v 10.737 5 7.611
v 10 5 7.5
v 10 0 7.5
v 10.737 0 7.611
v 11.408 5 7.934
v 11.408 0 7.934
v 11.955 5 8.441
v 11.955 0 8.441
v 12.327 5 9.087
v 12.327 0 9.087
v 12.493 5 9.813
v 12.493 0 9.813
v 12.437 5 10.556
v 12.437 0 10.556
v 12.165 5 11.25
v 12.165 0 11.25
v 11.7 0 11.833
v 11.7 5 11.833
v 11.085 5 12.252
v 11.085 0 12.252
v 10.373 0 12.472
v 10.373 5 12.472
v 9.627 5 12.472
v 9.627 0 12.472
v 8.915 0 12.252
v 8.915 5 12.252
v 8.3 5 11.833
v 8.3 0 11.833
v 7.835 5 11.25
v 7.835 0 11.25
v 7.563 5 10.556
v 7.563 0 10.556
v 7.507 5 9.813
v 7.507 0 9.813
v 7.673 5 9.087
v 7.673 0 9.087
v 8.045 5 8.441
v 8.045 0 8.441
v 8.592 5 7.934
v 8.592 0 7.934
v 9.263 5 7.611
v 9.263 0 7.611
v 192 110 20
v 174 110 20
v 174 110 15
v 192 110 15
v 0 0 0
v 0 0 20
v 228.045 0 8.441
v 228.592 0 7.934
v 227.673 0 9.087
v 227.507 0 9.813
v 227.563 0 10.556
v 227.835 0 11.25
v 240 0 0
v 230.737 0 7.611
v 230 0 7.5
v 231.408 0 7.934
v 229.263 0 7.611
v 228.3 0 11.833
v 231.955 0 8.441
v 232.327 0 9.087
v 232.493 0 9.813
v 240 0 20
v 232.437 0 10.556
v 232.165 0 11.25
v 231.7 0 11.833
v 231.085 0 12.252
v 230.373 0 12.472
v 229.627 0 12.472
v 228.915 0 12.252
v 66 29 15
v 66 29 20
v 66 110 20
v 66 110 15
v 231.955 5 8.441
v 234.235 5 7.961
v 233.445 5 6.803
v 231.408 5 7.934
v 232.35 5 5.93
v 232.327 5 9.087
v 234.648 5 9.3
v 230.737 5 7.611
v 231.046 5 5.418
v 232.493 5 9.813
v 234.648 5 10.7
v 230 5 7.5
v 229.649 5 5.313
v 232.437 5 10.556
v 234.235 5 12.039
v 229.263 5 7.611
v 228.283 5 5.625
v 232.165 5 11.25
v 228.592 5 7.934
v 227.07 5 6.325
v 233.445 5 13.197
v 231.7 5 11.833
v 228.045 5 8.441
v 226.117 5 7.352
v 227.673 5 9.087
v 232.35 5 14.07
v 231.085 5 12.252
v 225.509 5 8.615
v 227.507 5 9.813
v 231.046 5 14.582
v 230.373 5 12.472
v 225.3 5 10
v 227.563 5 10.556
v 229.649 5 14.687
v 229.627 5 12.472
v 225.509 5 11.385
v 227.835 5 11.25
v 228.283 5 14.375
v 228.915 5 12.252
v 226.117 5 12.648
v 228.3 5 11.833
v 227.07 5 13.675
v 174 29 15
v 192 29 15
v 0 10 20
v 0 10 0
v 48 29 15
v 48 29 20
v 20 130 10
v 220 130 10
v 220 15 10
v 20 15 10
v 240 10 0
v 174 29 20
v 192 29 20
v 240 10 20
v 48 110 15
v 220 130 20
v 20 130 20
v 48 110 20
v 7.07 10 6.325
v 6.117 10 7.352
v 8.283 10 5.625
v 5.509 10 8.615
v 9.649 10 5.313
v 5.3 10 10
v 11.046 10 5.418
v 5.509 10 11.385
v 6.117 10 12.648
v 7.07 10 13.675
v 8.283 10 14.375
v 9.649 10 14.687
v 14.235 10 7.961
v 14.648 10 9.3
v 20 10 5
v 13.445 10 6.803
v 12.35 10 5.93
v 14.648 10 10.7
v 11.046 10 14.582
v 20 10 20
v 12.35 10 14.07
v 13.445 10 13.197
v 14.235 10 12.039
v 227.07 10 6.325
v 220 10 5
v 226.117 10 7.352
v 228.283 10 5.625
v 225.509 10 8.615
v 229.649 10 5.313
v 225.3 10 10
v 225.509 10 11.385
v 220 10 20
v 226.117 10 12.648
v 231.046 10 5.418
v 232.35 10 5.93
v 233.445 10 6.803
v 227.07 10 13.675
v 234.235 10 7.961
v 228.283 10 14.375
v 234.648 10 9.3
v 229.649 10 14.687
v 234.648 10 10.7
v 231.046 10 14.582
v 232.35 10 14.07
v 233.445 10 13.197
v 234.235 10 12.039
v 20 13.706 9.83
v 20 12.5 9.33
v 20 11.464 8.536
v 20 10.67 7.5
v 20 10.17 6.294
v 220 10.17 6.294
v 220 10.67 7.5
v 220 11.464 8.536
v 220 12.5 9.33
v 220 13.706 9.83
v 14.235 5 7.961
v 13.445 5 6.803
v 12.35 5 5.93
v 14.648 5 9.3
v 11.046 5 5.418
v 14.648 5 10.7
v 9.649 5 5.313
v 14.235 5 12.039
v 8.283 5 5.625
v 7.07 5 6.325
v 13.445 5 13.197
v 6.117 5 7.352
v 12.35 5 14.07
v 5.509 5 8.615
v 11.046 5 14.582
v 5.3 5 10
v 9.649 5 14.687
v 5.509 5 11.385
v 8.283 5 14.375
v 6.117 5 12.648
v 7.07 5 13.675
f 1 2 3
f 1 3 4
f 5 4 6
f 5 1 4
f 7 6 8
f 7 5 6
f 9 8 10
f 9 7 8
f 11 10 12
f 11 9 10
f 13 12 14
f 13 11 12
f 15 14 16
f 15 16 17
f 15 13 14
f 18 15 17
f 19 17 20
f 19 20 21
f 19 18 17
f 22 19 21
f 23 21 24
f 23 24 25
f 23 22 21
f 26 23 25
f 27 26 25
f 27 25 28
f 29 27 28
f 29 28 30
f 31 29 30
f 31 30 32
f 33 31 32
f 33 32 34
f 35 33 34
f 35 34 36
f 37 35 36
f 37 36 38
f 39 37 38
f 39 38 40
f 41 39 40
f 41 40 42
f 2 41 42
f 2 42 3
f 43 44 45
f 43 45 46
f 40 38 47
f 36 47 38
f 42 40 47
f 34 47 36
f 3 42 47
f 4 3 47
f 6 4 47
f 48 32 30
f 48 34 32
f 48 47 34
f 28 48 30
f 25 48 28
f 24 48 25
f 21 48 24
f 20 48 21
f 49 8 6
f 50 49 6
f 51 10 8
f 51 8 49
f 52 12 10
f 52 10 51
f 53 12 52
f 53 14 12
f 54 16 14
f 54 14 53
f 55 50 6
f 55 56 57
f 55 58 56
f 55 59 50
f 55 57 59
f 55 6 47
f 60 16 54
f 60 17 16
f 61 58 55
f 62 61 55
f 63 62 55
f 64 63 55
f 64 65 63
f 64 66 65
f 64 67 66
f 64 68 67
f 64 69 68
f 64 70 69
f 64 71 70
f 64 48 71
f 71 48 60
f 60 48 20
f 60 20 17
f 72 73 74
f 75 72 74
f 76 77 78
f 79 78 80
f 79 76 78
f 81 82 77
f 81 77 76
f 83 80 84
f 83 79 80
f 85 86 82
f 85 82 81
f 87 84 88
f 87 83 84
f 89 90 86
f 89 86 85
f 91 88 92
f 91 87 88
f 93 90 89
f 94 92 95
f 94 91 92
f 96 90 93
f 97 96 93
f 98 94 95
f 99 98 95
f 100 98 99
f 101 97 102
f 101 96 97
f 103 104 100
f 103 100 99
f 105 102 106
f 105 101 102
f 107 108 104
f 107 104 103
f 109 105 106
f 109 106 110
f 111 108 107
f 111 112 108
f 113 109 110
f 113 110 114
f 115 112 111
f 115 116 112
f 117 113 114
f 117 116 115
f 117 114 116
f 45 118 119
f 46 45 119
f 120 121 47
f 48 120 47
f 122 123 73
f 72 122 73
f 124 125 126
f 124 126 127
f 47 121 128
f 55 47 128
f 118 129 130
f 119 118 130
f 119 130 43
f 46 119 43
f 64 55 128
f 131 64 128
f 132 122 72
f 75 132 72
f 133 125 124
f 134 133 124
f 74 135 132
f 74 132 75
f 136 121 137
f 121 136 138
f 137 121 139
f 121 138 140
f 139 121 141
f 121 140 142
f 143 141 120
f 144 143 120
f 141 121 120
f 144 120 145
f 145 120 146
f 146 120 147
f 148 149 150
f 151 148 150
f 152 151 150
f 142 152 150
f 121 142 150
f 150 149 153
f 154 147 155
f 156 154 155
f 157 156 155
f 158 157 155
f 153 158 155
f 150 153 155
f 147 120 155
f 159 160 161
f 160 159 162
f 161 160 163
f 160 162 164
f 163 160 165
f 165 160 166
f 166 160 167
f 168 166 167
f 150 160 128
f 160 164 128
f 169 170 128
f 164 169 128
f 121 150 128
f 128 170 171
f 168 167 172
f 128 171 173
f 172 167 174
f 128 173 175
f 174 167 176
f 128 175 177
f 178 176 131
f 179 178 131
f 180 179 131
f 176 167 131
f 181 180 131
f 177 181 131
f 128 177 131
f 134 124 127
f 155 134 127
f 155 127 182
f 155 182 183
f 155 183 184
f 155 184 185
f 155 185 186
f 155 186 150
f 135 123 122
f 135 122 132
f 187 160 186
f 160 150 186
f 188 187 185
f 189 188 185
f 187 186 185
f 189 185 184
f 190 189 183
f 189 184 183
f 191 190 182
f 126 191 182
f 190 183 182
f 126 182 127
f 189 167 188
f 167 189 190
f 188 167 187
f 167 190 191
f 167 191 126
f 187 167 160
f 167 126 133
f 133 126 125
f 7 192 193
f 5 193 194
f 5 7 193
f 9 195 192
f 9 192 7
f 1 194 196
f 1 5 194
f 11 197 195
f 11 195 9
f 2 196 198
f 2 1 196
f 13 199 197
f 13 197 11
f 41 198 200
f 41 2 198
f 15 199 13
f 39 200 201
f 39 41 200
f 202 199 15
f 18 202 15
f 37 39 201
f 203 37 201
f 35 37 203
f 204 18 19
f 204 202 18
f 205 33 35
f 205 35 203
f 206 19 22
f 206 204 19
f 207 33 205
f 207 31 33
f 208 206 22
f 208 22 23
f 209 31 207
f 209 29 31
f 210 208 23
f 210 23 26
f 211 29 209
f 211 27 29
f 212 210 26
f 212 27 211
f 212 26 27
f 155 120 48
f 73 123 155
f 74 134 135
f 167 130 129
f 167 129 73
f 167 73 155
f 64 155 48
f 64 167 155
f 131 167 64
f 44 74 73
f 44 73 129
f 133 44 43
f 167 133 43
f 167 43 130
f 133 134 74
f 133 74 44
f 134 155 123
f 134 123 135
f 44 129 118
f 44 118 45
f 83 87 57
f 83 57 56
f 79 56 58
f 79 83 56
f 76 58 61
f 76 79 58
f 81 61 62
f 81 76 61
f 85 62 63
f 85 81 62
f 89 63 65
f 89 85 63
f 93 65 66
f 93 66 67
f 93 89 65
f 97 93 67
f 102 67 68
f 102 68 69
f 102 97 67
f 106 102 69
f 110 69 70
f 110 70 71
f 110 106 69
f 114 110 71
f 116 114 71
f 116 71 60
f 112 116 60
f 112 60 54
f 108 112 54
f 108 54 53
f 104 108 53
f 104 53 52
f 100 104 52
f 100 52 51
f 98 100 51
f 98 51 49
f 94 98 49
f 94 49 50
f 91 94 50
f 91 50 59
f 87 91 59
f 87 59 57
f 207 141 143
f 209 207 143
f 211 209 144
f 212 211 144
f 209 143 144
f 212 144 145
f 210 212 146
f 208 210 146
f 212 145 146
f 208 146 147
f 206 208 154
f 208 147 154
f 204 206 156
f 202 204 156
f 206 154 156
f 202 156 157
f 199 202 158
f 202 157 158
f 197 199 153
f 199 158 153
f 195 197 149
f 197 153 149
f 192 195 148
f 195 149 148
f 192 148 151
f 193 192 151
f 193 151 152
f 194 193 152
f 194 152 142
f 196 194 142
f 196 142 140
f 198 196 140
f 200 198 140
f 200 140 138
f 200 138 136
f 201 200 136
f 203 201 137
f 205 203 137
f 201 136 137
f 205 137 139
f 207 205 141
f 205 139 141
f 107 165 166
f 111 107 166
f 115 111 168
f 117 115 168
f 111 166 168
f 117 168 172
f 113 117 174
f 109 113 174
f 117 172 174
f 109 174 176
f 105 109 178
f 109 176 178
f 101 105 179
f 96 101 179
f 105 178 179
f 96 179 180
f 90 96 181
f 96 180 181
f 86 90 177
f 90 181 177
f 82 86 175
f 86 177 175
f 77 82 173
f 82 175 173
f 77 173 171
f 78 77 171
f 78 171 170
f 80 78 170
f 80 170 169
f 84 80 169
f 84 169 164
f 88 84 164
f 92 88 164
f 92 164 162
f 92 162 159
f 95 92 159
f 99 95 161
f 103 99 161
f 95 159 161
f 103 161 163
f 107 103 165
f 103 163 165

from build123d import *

# Parameters (mm, degrees)
BOSS_EXTRUDE2_DEPTH = 20
SKETCH2_R           = 3
CUT_EXTRUDE1_DEPTH  = 20
SKETCH3_W           = 200
SKETCH3_H           = 120
CUT_EXTRUDE2_DEPTH  = 10
FILLET1_R           = 5
BOSS_EXTRUDE3_START = -10
SKETCH6_R           = 3
SKETCH6_R_2         = 2.5
BOSS_EXTRUDE3_DEPTH = 10
SKETCH7_R           = 4.7
CUT_EXTRUDE6_DEPTH  = 5
SKETCH4_W           = 18
SKETCH4_H           = 81
CUT_EXTRUDE7_DEPTH  = 5


with BuildPart() as part:
    # Sketch1 → Boss-Extrude2 (new body)
    with BuildSketch(Plane.XY):
        Polygon((0, 0), (240, 0), (240, 10), (220, 10), (220, 130), (20, 130), (20, 10), (0, 10), align=None)
    extrude(amount=BOSS_EXTRUDE2_DEPTH)

    # Sketch2 → Cut-Extrude1 (cut)
    with BuildSketch(Plane(origin=(0, 10, 0), x_dir=(1, 0, 0), z_dir=(0, 1, 0))):
        with Locations(Location((10, -10, 0), (0, 0, 180))):
            Circle(SKETCH2_R)
        with Locations(Location((230, -10, 0), (0, 0, 180))):
            Circle(SKETCH2_R)
    extrude(amount=-CUT_EXTRUDE1_DEPTH, mode=Mode.SUBTRACT)

    # Sketch3 → Cut-Extrude2 (cut)
    with BuildSketch(Plane(origin=(0, 0, 0), x_dir=(-1, 0, 0), z_dir=(0, 0, -1))):
        with Locations((-120, 70)):
            Rectangle(SKETCH3_W, SKETCH3_H)
    extrude(amount=-CUT_EXTRUDE2_DEPTH, mode=Mode.SUBTRACT)

    # Fillet1
    fillet1_edges = [part.edges().sort_by_distance(p)[0] for p in [
        (120, 10, 10),
    ]]
    fillet(fillet1_edges, radius=FILLET1_R)

    # Sketch6 → Boss-Extrude3 (add)
    # profile 1 of 2: a face of its own
    with BuildSketch(Plane.XZ.offset(BOSS_EXTRUDE3_START)):
        with Locations((10, 10)):
            Circle(SKETCH6_R)
        with Locations(Location((10, 10, 0), (0, 0, 270))):
            Circle(SKETCH6_R_2, mode=Mode.SUBTRACT)
    # profile 2 of 2: a face of its own
    with BuildSketch(Plane.XZ.offset(BOSS_EXTRUDE3_START)):
        with Locations((230, 10)):
            Circle(SKETCH6_R)
        with Locations(Location((230, 10, 0), (0, 0, 270))):
            Circle(SKETCH6_R_2, mode=Mode.SUBTRACT)
    extrude(amount=BOSS_EXTRUDE3_DEPTH)

    # Sketch7 → Cut-Extrude6 (cut)
    with BuildSketch(Plane(origin=(0, 10, 0), x_dir=(1, 0, 0), z_dir=(0, 1, 0))):
        with Locations(Location((230, -10, 0), (0, 0, 180))):
            Circle(SKETCH7_R)
        with Locations(Location((10, -10, 0), (0, 0, 180))):
            Circle(SKETCH7_R)
    extrude(amount=-CUT_EXTRUDE6_DEPTH, mode=Mode.SUBTRACT)

    # Sketch4 → Cut-Extrude7 (cut)
    with BuildSketch(Plane.XY.offset(20)):
        with Locations((57, 69.5)):
            Rectangle(SKETCH4_W, SKETCH4_H)
        with Locations((183, 69.5)):
            Rectangle(SKETCH4_W, SKETCH4_H)
    extrude(amount=-CUT_EXTRUDE7_DEPTH, mode=Mode.SUBTRACT)


solid = part.part
